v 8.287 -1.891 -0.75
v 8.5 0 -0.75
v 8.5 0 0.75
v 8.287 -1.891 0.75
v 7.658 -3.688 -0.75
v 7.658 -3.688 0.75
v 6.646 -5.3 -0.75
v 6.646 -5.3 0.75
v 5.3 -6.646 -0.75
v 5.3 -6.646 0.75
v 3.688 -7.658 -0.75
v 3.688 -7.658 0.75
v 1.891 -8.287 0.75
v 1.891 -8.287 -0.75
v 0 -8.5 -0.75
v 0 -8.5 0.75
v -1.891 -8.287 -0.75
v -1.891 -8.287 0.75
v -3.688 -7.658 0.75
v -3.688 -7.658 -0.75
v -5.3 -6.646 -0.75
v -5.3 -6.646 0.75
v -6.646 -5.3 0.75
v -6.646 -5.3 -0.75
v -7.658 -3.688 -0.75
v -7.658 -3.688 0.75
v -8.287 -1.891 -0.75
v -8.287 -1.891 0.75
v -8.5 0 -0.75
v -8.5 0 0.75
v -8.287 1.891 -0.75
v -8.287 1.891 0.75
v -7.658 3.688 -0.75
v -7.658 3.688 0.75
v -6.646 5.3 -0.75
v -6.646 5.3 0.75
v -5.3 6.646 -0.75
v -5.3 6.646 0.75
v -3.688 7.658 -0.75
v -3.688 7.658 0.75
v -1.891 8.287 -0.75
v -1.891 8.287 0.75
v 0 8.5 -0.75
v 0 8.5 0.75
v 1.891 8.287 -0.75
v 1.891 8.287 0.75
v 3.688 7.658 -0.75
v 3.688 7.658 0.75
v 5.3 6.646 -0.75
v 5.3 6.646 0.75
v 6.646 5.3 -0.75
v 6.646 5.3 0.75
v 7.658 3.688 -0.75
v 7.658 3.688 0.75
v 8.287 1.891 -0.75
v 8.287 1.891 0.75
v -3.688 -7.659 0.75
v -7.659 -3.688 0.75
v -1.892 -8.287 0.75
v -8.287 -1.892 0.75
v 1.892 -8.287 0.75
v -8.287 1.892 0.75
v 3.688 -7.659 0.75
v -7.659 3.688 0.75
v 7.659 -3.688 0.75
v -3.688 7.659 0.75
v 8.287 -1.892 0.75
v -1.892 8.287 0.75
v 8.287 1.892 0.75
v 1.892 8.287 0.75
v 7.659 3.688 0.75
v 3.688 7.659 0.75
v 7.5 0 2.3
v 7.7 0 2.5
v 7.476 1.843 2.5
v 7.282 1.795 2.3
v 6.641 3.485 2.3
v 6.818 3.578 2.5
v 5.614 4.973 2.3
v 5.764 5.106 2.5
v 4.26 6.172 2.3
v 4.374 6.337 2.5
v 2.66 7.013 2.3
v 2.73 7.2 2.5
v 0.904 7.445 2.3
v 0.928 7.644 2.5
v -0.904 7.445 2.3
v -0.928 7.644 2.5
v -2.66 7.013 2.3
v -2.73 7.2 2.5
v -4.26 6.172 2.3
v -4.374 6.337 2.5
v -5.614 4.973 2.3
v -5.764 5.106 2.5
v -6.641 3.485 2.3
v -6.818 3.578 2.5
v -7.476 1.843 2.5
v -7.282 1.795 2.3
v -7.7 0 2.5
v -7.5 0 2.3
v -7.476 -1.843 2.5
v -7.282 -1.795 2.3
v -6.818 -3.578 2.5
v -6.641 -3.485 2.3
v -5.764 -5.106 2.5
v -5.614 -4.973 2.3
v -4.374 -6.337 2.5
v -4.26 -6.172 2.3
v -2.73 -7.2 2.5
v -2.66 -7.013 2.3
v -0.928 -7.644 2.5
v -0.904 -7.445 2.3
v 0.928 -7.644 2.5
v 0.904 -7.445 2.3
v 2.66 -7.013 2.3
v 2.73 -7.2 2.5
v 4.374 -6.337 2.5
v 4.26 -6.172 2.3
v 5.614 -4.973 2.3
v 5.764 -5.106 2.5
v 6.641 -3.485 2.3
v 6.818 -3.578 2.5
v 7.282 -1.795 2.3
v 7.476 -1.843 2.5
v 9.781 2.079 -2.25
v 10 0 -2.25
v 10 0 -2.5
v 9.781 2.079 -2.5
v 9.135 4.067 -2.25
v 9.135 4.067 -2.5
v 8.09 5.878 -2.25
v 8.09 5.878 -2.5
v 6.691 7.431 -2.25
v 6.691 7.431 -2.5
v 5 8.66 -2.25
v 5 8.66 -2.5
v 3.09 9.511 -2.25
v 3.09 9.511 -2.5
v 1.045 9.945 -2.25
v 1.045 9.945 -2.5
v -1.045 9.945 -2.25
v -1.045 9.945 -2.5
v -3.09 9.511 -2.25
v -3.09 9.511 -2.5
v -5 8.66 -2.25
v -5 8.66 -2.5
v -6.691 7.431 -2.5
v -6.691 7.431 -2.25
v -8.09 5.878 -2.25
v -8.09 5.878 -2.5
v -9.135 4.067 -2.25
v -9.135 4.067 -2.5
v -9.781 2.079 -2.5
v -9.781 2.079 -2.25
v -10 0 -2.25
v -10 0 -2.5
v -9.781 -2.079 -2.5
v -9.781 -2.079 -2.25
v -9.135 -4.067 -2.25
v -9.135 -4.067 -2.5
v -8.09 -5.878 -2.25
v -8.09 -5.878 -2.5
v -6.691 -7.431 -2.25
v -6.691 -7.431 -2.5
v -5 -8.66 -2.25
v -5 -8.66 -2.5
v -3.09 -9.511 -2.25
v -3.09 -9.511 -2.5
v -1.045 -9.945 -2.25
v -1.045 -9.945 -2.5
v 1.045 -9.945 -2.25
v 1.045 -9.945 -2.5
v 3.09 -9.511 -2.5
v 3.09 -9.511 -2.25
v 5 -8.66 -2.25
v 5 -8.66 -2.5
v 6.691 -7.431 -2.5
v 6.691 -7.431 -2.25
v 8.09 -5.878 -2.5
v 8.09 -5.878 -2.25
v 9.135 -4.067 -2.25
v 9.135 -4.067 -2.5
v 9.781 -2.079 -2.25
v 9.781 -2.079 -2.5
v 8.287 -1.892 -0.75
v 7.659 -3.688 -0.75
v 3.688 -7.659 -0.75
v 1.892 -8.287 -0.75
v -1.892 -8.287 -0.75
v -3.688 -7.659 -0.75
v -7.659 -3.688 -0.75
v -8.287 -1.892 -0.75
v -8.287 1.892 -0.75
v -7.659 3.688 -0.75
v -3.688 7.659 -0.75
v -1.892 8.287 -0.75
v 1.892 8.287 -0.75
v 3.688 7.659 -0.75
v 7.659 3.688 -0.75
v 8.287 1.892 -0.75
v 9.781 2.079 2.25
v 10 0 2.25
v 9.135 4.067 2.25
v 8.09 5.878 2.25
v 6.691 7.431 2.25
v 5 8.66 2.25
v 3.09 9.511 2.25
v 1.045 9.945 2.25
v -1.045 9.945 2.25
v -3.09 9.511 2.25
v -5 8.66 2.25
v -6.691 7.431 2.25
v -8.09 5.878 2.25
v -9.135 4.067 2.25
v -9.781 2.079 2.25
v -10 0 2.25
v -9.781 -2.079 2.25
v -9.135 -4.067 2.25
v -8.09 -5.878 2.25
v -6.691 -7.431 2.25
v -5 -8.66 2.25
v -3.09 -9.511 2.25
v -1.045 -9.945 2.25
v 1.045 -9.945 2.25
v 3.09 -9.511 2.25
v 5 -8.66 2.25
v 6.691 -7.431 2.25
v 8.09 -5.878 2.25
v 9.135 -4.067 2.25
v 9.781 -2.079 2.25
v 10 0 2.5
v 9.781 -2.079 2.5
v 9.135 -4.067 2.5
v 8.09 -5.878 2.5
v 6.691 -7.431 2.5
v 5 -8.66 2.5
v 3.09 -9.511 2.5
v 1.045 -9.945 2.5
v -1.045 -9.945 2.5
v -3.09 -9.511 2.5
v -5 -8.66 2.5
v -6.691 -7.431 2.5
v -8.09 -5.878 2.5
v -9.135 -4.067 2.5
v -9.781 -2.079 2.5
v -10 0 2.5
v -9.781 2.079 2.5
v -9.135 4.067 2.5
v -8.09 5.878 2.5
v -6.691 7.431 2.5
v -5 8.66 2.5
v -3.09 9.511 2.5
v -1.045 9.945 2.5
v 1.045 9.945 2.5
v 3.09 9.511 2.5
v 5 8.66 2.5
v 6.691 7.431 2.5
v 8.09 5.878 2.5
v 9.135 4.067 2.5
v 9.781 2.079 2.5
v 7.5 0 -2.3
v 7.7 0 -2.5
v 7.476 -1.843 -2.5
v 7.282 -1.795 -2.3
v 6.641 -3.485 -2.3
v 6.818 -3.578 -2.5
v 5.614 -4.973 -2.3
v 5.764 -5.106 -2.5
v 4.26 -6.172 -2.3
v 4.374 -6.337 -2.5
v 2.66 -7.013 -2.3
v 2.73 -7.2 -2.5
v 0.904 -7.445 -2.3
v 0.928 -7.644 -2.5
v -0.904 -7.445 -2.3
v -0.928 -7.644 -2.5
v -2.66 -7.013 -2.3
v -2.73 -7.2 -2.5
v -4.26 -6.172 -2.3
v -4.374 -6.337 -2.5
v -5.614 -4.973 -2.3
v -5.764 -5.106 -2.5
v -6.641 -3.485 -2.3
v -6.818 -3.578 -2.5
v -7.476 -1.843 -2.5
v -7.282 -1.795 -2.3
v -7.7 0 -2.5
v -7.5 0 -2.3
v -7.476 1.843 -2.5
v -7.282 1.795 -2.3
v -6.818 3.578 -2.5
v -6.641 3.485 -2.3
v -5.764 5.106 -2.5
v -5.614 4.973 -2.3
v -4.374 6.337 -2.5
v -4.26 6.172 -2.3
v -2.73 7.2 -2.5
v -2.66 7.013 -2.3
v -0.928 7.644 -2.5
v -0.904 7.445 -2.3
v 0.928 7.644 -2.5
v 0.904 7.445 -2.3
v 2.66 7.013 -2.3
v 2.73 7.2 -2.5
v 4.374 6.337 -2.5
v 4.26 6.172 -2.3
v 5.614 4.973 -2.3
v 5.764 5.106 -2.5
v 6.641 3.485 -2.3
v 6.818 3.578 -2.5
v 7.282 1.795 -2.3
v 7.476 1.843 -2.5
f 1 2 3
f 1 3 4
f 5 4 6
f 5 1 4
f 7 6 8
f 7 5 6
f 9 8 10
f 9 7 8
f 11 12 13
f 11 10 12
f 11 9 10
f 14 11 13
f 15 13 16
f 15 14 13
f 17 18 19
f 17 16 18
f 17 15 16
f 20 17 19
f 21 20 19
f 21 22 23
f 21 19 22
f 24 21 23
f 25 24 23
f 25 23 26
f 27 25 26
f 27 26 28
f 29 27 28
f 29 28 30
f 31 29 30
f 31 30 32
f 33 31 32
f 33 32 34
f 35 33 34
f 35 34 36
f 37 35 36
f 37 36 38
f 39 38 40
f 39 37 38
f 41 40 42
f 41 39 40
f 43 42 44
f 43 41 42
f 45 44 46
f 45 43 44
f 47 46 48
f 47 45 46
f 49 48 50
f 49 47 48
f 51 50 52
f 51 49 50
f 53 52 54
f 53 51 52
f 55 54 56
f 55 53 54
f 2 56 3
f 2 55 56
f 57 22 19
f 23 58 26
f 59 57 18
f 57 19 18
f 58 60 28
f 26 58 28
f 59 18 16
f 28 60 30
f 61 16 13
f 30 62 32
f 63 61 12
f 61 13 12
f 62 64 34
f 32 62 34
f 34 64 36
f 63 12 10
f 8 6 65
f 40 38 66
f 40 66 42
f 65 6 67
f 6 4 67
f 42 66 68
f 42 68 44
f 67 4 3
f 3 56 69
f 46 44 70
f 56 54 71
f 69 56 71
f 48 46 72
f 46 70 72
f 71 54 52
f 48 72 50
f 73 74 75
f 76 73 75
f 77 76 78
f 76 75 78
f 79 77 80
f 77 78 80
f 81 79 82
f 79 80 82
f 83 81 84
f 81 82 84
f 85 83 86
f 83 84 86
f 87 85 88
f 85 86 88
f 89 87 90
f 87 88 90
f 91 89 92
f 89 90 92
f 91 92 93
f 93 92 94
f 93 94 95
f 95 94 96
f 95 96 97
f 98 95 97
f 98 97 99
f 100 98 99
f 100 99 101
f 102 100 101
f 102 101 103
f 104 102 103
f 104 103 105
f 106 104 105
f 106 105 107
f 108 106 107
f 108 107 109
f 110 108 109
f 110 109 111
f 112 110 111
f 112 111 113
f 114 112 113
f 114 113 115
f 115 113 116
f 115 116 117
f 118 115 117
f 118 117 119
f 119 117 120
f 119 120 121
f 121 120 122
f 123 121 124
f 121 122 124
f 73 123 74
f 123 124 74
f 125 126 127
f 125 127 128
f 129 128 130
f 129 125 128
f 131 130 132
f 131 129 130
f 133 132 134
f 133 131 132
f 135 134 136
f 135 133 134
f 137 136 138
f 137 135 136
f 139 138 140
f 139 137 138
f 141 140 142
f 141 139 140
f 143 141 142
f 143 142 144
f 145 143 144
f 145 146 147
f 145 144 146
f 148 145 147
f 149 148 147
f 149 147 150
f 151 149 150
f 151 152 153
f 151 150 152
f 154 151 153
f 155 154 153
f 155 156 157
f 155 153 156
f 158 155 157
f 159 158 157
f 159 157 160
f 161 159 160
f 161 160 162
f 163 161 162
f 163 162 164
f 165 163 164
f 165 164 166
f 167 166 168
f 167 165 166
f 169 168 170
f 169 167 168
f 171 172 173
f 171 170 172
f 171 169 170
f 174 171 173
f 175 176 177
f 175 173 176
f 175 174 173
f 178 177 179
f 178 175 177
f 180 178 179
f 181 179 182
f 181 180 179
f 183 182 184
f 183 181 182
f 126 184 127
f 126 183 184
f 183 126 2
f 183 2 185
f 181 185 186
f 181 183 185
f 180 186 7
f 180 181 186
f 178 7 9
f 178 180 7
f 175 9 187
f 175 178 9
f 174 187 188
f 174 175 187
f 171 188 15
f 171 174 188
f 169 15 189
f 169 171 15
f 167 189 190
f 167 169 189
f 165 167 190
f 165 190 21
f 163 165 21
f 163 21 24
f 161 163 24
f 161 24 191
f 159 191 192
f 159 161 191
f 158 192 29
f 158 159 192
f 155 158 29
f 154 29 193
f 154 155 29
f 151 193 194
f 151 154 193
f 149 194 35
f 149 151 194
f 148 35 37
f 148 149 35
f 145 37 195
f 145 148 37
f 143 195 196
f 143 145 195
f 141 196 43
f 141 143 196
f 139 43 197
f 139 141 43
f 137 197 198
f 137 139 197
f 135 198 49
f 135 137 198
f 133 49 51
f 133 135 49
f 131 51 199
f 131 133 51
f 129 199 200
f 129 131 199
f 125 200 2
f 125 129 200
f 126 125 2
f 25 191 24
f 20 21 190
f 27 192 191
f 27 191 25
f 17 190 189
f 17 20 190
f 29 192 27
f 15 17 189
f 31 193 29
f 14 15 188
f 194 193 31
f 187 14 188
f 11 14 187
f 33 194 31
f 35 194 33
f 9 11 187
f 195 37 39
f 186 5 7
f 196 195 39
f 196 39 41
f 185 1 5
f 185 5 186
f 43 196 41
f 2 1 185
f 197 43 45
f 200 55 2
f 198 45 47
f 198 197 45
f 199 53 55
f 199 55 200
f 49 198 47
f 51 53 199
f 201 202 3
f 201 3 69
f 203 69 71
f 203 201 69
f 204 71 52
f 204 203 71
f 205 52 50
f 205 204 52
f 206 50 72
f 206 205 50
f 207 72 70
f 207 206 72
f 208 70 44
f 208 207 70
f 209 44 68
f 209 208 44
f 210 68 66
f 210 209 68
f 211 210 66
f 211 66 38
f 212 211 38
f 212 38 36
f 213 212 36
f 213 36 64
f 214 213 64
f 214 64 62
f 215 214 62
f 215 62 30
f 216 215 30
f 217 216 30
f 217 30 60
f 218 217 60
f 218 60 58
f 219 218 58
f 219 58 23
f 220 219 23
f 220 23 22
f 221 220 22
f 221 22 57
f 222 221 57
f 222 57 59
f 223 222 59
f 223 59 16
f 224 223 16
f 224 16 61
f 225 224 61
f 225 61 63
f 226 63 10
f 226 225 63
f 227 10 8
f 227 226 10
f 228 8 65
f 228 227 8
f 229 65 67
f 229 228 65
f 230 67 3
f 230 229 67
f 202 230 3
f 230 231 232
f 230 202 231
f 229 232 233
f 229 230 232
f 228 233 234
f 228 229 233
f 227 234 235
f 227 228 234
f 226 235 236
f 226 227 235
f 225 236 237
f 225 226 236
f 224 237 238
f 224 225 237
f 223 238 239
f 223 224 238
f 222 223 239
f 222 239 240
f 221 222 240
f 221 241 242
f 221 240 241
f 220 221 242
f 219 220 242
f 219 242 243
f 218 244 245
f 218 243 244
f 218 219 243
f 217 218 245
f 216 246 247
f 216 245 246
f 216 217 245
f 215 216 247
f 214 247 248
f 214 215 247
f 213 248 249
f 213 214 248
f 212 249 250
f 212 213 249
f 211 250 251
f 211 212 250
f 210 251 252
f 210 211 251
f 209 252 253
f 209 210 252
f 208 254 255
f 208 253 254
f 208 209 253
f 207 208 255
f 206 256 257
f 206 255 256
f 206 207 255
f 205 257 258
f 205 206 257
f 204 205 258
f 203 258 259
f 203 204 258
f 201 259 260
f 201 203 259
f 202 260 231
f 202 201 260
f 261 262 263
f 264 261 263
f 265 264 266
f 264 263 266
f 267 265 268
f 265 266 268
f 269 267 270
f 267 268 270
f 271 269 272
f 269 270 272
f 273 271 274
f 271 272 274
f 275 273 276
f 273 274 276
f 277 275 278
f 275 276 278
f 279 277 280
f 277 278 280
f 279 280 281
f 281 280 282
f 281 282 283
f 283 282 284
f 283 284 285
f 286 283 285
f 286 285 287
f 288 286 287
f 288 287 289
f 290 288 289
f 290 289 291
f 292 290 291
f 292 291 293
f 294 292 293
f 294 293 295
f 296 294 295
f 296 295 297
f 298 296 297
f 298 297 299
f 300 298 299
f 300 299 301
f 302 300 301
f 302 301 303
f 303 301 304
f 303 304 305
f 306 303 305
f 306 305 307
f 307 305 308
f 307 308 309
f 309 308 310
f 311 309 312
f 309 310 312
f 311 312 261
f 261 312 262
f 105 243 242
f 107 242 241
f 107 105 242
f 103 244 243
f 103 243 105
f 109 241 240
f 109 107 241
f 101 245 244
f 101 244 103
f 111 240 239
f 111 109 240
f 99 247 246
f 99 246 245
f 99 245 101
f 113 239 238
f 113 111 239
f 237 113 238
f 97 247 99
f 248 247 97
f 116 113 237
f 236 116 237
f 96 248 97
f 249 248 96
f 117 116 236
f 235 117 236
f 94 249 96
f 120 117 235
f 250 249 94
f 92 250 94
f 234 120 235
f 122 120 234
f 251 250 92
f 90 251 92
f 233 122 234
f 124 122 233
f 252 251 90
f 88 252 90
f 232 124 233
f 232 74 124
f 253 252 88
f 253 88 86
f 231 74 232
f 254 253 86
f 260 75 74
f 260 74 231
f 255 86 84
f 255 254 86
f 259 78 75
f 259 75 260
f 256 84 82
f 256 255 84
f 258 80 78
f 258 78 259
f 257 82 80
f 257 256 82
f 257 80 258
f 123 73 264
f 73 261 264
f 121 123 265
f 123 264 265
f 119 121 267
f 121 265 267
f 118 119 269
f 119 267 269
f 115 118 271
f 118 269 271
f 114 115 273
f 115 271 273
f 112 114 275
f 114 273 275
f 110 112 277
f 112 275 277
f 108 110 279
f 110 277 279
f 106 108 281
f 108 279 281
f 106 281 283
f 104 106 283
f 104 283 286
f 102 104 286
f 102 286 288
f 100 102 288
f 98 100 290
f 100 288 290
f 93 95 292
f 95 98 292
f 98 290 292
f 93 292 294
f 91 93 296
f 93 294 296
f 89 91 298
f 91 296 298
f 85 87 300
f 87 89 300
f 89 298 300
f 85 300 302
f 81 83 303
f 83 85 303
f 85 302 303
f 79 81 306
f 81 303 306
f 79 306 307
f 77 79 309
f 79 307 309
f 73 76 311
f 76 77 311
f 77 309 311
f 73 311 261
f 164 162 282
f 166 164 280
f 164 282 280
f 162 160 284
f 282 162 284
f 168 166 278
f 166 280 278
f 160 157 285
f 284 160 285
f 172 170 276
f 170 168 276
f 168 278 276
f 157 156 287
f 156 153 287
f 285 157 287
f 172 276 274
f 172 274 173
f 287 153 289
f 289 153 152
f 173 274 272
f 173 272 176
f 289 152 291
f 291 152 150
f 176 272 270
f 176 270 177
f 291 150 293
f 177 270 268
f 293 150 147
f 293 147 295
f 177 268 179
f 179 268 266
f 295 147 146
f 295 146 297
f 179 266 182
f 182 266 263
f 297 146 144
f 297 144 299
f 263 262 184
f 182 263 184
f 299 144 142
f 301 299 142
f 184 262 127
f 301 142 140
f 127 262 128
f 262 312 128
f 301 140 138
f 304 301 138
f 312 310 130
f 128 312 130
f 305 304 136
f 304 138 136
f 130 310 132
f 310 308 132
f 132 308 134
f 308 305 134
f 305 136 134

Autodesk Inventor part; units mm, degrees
ref_plane "YZ Plane" through (0, 0, 0) normal (1, 0, 0) x (0, 1, 0)
ref_plane "XZ Plane" through (0, 0, 0) normal (0, 1, 0) x (-1, 0, 0)
ref_plane "XY Plane" through (0, 0, 0) normal (0, 0, 1) x (1, 0, 0)
sketch "Skizze1" plane through (0, 0, 0) normal (0, 0, 1) x (1, 0, 0)
  line L0 (-14, 0) -> (14, 0) projected
  line L1 (0, -14) -> (0, 14) projected
  circle A0 centre (0, 0) radius 7.5
  circle A1 centre (0, 0) radius 10
  dimension "d0" = 15
  dimension "d1" = 20
extrude "Extrusion1" add sketch "Skizze1" along normal mid plane 5 contours A0 L1 A1 L0 | L0 A1 L1 A0 | A0 L0 A1 L1 | L1 A1 L0 A0
sketch "Skizze2" plane through (0, 0, 0) normal (0, 0, 1) x (1, 0, 0)
  circle A0 centre (0, 0) radius 7.5 projected
  circle A1 centre (0, 0) radius 10 projected
  circle A2 centre (0, 0) radius 7.5 projected
  circle A3 centre (0, 0) radius 10 projected
  line L0 (-14, 0) -> (14, 0) projected
  line L1 (0, -14) -> (0, 14) projected
  circle A4 centre (0, 0) radius 8.5
  dimension "d4" = 17
extrude "Extrusion2" cut sketch "Skizze2" along normal mid plane 1.5 contours A4 L1 A1 L0 | L0 A1 L1 A4 | A4 L0 A1 L1 | L1 A1 L0 A4
chamfer "Fase1" distance 1.5 angle 45 2 edges at (-10, 0, 0.75) (-10, 0, -0.75)
chamfer "Fase2" distance 0.2 angle 45 1 edges at (-7.5, 0, 2.5)
chamfer "Fase3" distance 0.2 angle 45 1 edges at (-7.5, 0, -2.5)
properties part number "Seilrolle" material "ABS-Kunststoff"
